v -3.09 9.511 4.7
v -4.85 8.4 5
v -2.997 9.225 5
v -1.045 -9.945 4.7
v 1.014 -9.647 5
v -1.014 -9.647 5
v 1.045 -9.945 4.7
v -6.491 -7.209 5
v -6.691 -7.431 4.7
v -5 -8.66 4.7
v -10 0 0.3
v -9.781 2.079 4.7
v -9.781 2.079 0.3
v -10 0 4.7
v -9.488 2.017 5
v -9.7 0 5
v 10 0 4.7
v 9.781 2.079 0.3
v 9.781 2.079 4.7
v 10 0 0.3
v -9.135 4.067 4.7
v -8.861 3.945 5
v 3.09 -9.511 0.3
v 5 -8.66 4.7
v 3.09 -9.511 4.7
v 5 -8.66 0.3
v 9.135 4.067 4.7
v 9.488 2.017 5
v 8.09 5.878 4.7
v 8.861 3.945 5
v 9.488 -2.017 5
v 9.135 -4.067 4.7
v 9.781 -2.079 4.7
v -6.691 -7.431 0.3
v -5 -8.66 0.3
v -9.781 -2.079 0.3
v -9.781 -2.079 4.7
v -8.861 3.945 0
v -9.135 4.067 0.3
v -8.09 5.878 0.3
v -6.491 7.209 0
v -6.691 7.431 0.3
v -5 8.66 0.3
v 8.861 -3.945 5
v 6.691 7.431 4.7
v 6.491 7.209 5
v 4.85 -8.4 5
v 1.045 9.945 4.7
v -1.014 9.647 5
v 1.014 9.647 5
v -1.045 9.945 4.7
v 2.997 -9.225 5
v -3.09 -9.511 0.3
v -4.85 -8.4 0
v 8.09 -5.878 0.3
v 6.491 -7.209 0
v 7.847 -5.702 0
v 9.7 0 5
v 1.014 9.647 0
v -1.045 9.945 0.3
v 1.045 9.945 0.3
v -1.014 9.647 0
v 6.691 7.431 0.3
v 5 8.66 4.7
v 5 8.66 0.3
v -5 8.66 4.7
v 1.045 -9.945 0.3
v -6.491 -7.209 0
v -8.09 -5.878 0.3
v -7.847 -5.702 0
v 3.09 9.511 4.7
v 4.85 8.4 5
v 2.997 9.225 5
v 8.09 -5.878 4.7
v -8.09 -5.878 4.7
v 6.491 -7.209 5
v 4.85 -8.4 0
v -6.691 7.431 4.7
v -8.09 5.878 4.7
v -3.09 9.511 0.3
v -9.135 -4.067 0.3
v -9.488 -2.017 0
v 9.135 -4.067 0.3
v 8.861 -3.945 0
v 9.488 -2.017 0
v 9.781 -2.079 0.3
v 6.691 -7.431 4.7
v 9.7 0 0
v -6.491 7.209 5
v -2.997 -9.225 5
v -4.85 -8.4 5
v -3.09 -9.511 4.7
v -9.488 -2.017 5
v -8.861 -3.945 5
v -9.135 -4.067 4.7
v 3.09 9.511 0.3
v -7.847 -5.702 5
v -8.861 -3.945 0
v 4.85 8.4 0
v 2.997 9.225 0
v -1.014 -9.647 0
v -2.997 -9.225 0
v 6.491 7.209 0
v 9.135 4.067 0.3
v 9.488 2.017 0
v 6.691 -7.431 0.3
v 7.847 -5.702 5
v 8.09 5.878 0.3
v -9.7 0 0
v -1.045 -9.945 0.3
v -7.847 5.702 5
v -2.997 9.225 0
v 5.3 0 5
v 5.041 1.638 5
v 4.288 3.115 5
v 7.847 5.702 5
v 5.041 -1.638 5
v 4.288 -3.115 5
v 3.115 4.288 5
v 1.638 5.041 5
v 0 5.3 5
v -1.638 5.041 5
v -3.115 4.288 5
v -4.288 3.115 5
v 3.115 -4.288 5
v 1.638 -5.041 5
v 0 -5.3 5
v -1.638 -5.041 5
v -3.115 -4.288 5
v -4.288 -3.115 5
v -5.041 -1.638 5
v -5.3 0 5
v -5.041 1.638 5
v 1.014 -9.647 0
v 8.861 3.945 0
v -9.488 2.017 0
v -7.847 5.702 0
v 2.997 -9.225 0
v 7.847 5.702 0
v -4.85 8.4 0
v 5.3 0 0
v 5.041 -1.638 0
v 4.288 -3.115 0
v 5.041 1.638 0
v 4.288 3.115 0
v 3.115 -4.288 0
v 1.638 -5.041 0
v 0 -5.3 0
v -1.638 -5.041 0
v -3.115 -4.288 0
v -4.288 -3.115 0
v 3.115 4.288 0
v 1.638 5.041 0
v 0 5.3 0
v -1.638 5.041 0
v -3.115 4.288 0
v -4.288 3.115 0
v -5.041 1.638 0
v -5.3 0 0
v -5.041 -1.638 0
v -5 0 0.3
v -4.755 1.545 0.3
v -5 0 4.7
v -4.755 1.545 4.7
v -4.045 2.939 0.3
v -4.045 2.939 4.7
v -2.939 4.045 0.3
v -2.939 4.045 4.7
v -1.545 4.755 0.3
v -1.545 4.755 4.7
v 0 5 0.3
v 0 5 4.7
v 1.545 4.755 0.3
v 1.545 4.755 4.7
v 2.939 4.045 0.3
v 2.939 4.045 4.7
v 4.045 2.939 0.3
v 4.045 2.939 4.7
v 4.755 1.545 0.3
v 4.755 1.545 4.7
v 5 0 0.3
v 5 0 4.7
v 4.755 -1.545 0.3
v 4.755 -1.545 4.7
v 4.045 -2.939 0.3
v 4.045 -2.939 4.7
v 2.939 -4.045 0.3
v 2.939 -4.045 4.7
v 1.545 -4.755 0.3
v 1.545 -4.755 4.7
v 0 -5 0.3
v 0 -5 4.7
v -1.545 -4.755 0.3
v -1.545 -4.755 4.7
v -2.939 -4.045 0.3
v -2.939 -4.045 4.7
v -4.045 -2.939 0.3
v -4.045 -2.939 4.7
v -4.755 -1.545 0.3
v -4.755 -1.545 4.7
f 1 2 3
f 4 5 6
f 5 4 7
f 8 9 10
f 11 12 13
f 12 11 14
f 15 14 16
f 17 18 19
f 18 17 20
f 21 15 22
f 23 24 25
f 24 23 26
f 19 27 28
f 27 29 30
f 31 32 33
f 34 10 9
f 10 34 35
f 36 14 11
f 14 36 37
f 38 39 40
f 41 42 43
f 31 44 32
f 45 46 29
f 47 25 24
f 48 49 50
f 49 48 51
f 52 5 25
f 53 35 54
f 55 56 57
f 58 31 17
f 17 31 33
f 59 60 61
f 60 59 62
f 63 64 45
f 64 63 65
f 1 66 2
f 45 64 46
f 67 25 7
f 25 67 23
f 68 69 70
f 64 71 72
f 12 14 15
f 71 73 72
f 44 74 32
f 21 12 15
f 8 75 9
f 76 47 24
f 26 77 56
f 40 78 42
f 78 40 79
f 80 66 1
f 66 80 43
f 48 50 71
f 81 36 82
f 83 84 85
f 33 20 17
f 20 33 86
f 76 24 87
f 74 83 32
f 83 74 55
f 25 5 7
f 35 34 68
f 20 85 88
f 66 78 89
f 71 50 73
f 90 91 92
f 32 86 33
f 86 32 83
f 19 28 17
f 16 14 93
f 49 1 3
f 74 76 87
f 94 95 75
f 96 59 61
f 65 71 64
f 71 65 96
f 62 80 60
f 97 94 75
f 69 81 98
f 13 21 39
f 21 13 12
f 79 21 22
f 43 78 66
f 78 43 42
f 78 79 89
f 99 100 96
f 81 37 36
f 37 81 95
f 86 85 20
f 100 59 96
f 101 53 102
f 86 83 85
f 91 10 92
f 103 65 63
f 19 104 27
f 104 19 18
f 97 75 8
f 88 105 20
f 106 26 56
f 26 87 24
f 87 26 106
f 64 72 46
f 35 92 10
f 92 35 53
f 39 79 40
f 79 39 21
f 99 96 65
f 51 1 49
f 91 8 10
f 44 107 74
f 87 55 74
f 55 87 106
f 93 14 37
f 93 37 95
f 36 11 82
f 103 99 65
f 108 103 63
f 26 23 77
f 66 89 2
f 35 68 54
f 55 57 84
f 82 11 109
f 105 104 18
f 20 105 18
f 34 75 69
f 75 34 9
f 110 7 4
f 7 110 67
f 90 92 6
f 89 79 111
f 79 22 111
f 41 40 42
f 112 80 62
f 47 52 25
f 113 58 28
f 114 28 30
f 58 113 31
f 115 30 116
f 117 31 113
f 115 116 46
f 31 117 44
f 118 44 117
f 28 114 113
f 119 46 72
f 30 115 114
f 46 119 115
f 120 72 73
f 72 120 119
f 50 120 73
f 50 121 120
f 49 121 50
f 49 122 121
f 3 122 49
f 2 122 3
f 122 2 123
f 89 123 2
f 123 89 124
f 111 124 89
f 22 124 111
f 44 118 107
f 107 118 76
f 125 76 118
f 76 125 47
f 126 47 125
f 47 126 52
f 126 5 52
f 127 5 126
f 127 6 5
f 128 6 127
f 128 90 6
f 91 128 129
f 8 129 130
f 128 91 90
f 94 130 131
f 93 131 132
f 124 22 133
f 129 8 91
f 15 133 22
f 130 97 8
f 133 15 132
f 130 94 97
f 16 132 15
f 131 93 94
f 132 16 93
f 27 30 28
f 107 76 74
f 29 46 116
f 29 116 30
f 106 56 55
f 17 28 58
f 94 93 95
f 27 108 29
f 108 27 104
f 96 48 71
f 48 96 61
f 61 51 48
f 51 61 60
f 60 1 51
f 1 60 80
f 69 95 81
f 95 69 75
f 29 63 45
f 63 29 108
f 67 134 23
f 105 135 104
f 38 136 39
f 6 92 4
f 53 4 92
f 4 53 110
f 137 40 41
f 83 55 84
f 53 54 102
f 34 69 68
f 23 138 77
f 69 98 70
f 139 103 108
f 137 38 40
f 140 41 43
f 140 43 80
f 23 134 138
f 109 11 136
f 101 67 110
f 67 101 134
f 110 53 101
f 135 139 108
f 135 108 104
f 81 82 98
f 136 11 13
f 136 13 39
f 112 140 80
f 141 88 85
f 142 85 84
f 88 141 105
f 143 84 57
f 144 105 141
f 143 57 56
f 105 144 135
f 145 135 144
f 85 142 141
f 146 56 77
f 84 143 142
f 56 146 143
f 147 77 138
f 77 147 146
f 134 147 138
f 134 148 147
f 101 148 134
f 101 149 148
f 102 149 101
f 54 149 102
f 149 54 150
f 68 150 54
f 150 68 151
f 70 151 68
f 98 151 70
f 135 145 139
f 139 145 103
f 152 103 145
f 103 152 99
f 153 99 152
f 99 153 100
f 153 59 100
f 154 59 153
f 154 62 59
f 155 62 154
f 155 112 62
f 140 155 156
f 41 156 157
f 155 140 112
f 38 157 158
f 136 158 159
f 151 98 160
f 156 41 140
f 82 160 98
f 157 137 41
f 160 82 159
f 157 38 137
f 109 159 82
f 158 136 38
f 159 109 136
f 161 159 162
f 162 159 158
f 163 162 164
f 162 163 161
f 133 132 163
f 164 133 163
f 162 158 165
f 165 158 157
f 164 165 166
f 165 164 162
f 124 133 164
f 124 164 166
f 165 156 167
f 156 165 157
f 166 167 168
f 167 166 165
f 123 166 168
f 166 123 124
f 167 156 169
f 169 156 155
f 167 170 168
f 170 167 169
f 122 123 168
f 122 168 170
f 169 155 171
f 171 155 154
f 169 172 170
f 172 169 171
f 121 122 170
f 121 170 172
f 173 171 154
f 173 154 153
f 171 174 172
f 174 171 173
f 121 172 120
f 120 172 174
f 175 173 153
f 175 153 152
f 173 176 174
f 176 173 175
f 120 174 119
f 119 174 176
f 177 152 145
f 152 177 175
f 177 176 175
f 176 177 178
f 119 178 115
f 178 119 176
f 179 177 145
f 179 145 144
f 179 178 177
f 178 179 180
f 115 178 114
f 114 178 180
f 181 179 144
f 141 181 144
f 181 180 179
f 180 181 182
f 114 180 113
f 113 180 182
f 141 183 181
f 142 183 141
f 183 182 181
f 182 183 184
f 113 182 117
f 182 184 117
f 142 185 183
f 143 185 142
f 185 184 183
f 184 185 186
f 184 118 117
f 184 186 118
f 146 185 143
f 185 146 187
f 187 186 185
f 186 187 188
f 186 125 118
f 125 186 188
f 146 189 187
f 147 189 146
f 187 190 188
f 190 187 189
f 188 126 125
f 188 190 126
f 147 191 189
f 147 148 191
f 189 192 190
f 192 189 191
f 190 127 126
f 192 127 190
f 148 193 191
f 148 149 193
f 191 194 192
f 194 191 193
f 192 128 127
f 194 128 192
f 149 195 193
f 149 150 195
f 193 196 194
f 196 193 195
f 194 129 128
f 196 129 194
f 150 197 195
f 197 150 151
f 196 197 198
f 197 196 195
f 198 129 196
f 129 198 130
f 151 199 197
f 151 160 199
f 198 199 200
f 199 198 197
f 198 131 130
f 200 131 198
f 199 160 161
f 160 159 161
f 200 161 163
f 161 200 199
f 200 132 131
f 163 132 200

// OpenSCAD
// file: chamferedCylinder.scad
chamferedCylinder(10,10,0.3,true);

module chamferedCylinder(h=1,d=1,chamfer=0.3,hole=false){
    //cylinder(h=h,d=d,$fn=20);
    if(hole){
        path=[[0,-0.1],[d/2+chamfer,-0.1],[d/2+chamfer,0],[d/2,chamfer],[d/2,h-chamfer],[d/2+chamfer,h],[d/2+chamfer,h+0.1],[0,h+0.1]];
    rotate_extrude() polygon(path);
        }
    else{
        path=[[0,0],[d/2-chamfer,0],[d/2,chamfer],[d/2,h-chamfer],[d/2-chamfer,h],[0,h]];
    rotate_extrude() polygon(path);
         }
}
// main file
use <chamferedCylinder.scad>

spacer(id=10,od=20,t=5);

module spacer(id=3,od=6,t=5){
    difference(){
        chamferedCylinder(h=t,d=od);
        chamferedCylinder(h=t,d=id,hole=true,$fn=20 );
    }
}
